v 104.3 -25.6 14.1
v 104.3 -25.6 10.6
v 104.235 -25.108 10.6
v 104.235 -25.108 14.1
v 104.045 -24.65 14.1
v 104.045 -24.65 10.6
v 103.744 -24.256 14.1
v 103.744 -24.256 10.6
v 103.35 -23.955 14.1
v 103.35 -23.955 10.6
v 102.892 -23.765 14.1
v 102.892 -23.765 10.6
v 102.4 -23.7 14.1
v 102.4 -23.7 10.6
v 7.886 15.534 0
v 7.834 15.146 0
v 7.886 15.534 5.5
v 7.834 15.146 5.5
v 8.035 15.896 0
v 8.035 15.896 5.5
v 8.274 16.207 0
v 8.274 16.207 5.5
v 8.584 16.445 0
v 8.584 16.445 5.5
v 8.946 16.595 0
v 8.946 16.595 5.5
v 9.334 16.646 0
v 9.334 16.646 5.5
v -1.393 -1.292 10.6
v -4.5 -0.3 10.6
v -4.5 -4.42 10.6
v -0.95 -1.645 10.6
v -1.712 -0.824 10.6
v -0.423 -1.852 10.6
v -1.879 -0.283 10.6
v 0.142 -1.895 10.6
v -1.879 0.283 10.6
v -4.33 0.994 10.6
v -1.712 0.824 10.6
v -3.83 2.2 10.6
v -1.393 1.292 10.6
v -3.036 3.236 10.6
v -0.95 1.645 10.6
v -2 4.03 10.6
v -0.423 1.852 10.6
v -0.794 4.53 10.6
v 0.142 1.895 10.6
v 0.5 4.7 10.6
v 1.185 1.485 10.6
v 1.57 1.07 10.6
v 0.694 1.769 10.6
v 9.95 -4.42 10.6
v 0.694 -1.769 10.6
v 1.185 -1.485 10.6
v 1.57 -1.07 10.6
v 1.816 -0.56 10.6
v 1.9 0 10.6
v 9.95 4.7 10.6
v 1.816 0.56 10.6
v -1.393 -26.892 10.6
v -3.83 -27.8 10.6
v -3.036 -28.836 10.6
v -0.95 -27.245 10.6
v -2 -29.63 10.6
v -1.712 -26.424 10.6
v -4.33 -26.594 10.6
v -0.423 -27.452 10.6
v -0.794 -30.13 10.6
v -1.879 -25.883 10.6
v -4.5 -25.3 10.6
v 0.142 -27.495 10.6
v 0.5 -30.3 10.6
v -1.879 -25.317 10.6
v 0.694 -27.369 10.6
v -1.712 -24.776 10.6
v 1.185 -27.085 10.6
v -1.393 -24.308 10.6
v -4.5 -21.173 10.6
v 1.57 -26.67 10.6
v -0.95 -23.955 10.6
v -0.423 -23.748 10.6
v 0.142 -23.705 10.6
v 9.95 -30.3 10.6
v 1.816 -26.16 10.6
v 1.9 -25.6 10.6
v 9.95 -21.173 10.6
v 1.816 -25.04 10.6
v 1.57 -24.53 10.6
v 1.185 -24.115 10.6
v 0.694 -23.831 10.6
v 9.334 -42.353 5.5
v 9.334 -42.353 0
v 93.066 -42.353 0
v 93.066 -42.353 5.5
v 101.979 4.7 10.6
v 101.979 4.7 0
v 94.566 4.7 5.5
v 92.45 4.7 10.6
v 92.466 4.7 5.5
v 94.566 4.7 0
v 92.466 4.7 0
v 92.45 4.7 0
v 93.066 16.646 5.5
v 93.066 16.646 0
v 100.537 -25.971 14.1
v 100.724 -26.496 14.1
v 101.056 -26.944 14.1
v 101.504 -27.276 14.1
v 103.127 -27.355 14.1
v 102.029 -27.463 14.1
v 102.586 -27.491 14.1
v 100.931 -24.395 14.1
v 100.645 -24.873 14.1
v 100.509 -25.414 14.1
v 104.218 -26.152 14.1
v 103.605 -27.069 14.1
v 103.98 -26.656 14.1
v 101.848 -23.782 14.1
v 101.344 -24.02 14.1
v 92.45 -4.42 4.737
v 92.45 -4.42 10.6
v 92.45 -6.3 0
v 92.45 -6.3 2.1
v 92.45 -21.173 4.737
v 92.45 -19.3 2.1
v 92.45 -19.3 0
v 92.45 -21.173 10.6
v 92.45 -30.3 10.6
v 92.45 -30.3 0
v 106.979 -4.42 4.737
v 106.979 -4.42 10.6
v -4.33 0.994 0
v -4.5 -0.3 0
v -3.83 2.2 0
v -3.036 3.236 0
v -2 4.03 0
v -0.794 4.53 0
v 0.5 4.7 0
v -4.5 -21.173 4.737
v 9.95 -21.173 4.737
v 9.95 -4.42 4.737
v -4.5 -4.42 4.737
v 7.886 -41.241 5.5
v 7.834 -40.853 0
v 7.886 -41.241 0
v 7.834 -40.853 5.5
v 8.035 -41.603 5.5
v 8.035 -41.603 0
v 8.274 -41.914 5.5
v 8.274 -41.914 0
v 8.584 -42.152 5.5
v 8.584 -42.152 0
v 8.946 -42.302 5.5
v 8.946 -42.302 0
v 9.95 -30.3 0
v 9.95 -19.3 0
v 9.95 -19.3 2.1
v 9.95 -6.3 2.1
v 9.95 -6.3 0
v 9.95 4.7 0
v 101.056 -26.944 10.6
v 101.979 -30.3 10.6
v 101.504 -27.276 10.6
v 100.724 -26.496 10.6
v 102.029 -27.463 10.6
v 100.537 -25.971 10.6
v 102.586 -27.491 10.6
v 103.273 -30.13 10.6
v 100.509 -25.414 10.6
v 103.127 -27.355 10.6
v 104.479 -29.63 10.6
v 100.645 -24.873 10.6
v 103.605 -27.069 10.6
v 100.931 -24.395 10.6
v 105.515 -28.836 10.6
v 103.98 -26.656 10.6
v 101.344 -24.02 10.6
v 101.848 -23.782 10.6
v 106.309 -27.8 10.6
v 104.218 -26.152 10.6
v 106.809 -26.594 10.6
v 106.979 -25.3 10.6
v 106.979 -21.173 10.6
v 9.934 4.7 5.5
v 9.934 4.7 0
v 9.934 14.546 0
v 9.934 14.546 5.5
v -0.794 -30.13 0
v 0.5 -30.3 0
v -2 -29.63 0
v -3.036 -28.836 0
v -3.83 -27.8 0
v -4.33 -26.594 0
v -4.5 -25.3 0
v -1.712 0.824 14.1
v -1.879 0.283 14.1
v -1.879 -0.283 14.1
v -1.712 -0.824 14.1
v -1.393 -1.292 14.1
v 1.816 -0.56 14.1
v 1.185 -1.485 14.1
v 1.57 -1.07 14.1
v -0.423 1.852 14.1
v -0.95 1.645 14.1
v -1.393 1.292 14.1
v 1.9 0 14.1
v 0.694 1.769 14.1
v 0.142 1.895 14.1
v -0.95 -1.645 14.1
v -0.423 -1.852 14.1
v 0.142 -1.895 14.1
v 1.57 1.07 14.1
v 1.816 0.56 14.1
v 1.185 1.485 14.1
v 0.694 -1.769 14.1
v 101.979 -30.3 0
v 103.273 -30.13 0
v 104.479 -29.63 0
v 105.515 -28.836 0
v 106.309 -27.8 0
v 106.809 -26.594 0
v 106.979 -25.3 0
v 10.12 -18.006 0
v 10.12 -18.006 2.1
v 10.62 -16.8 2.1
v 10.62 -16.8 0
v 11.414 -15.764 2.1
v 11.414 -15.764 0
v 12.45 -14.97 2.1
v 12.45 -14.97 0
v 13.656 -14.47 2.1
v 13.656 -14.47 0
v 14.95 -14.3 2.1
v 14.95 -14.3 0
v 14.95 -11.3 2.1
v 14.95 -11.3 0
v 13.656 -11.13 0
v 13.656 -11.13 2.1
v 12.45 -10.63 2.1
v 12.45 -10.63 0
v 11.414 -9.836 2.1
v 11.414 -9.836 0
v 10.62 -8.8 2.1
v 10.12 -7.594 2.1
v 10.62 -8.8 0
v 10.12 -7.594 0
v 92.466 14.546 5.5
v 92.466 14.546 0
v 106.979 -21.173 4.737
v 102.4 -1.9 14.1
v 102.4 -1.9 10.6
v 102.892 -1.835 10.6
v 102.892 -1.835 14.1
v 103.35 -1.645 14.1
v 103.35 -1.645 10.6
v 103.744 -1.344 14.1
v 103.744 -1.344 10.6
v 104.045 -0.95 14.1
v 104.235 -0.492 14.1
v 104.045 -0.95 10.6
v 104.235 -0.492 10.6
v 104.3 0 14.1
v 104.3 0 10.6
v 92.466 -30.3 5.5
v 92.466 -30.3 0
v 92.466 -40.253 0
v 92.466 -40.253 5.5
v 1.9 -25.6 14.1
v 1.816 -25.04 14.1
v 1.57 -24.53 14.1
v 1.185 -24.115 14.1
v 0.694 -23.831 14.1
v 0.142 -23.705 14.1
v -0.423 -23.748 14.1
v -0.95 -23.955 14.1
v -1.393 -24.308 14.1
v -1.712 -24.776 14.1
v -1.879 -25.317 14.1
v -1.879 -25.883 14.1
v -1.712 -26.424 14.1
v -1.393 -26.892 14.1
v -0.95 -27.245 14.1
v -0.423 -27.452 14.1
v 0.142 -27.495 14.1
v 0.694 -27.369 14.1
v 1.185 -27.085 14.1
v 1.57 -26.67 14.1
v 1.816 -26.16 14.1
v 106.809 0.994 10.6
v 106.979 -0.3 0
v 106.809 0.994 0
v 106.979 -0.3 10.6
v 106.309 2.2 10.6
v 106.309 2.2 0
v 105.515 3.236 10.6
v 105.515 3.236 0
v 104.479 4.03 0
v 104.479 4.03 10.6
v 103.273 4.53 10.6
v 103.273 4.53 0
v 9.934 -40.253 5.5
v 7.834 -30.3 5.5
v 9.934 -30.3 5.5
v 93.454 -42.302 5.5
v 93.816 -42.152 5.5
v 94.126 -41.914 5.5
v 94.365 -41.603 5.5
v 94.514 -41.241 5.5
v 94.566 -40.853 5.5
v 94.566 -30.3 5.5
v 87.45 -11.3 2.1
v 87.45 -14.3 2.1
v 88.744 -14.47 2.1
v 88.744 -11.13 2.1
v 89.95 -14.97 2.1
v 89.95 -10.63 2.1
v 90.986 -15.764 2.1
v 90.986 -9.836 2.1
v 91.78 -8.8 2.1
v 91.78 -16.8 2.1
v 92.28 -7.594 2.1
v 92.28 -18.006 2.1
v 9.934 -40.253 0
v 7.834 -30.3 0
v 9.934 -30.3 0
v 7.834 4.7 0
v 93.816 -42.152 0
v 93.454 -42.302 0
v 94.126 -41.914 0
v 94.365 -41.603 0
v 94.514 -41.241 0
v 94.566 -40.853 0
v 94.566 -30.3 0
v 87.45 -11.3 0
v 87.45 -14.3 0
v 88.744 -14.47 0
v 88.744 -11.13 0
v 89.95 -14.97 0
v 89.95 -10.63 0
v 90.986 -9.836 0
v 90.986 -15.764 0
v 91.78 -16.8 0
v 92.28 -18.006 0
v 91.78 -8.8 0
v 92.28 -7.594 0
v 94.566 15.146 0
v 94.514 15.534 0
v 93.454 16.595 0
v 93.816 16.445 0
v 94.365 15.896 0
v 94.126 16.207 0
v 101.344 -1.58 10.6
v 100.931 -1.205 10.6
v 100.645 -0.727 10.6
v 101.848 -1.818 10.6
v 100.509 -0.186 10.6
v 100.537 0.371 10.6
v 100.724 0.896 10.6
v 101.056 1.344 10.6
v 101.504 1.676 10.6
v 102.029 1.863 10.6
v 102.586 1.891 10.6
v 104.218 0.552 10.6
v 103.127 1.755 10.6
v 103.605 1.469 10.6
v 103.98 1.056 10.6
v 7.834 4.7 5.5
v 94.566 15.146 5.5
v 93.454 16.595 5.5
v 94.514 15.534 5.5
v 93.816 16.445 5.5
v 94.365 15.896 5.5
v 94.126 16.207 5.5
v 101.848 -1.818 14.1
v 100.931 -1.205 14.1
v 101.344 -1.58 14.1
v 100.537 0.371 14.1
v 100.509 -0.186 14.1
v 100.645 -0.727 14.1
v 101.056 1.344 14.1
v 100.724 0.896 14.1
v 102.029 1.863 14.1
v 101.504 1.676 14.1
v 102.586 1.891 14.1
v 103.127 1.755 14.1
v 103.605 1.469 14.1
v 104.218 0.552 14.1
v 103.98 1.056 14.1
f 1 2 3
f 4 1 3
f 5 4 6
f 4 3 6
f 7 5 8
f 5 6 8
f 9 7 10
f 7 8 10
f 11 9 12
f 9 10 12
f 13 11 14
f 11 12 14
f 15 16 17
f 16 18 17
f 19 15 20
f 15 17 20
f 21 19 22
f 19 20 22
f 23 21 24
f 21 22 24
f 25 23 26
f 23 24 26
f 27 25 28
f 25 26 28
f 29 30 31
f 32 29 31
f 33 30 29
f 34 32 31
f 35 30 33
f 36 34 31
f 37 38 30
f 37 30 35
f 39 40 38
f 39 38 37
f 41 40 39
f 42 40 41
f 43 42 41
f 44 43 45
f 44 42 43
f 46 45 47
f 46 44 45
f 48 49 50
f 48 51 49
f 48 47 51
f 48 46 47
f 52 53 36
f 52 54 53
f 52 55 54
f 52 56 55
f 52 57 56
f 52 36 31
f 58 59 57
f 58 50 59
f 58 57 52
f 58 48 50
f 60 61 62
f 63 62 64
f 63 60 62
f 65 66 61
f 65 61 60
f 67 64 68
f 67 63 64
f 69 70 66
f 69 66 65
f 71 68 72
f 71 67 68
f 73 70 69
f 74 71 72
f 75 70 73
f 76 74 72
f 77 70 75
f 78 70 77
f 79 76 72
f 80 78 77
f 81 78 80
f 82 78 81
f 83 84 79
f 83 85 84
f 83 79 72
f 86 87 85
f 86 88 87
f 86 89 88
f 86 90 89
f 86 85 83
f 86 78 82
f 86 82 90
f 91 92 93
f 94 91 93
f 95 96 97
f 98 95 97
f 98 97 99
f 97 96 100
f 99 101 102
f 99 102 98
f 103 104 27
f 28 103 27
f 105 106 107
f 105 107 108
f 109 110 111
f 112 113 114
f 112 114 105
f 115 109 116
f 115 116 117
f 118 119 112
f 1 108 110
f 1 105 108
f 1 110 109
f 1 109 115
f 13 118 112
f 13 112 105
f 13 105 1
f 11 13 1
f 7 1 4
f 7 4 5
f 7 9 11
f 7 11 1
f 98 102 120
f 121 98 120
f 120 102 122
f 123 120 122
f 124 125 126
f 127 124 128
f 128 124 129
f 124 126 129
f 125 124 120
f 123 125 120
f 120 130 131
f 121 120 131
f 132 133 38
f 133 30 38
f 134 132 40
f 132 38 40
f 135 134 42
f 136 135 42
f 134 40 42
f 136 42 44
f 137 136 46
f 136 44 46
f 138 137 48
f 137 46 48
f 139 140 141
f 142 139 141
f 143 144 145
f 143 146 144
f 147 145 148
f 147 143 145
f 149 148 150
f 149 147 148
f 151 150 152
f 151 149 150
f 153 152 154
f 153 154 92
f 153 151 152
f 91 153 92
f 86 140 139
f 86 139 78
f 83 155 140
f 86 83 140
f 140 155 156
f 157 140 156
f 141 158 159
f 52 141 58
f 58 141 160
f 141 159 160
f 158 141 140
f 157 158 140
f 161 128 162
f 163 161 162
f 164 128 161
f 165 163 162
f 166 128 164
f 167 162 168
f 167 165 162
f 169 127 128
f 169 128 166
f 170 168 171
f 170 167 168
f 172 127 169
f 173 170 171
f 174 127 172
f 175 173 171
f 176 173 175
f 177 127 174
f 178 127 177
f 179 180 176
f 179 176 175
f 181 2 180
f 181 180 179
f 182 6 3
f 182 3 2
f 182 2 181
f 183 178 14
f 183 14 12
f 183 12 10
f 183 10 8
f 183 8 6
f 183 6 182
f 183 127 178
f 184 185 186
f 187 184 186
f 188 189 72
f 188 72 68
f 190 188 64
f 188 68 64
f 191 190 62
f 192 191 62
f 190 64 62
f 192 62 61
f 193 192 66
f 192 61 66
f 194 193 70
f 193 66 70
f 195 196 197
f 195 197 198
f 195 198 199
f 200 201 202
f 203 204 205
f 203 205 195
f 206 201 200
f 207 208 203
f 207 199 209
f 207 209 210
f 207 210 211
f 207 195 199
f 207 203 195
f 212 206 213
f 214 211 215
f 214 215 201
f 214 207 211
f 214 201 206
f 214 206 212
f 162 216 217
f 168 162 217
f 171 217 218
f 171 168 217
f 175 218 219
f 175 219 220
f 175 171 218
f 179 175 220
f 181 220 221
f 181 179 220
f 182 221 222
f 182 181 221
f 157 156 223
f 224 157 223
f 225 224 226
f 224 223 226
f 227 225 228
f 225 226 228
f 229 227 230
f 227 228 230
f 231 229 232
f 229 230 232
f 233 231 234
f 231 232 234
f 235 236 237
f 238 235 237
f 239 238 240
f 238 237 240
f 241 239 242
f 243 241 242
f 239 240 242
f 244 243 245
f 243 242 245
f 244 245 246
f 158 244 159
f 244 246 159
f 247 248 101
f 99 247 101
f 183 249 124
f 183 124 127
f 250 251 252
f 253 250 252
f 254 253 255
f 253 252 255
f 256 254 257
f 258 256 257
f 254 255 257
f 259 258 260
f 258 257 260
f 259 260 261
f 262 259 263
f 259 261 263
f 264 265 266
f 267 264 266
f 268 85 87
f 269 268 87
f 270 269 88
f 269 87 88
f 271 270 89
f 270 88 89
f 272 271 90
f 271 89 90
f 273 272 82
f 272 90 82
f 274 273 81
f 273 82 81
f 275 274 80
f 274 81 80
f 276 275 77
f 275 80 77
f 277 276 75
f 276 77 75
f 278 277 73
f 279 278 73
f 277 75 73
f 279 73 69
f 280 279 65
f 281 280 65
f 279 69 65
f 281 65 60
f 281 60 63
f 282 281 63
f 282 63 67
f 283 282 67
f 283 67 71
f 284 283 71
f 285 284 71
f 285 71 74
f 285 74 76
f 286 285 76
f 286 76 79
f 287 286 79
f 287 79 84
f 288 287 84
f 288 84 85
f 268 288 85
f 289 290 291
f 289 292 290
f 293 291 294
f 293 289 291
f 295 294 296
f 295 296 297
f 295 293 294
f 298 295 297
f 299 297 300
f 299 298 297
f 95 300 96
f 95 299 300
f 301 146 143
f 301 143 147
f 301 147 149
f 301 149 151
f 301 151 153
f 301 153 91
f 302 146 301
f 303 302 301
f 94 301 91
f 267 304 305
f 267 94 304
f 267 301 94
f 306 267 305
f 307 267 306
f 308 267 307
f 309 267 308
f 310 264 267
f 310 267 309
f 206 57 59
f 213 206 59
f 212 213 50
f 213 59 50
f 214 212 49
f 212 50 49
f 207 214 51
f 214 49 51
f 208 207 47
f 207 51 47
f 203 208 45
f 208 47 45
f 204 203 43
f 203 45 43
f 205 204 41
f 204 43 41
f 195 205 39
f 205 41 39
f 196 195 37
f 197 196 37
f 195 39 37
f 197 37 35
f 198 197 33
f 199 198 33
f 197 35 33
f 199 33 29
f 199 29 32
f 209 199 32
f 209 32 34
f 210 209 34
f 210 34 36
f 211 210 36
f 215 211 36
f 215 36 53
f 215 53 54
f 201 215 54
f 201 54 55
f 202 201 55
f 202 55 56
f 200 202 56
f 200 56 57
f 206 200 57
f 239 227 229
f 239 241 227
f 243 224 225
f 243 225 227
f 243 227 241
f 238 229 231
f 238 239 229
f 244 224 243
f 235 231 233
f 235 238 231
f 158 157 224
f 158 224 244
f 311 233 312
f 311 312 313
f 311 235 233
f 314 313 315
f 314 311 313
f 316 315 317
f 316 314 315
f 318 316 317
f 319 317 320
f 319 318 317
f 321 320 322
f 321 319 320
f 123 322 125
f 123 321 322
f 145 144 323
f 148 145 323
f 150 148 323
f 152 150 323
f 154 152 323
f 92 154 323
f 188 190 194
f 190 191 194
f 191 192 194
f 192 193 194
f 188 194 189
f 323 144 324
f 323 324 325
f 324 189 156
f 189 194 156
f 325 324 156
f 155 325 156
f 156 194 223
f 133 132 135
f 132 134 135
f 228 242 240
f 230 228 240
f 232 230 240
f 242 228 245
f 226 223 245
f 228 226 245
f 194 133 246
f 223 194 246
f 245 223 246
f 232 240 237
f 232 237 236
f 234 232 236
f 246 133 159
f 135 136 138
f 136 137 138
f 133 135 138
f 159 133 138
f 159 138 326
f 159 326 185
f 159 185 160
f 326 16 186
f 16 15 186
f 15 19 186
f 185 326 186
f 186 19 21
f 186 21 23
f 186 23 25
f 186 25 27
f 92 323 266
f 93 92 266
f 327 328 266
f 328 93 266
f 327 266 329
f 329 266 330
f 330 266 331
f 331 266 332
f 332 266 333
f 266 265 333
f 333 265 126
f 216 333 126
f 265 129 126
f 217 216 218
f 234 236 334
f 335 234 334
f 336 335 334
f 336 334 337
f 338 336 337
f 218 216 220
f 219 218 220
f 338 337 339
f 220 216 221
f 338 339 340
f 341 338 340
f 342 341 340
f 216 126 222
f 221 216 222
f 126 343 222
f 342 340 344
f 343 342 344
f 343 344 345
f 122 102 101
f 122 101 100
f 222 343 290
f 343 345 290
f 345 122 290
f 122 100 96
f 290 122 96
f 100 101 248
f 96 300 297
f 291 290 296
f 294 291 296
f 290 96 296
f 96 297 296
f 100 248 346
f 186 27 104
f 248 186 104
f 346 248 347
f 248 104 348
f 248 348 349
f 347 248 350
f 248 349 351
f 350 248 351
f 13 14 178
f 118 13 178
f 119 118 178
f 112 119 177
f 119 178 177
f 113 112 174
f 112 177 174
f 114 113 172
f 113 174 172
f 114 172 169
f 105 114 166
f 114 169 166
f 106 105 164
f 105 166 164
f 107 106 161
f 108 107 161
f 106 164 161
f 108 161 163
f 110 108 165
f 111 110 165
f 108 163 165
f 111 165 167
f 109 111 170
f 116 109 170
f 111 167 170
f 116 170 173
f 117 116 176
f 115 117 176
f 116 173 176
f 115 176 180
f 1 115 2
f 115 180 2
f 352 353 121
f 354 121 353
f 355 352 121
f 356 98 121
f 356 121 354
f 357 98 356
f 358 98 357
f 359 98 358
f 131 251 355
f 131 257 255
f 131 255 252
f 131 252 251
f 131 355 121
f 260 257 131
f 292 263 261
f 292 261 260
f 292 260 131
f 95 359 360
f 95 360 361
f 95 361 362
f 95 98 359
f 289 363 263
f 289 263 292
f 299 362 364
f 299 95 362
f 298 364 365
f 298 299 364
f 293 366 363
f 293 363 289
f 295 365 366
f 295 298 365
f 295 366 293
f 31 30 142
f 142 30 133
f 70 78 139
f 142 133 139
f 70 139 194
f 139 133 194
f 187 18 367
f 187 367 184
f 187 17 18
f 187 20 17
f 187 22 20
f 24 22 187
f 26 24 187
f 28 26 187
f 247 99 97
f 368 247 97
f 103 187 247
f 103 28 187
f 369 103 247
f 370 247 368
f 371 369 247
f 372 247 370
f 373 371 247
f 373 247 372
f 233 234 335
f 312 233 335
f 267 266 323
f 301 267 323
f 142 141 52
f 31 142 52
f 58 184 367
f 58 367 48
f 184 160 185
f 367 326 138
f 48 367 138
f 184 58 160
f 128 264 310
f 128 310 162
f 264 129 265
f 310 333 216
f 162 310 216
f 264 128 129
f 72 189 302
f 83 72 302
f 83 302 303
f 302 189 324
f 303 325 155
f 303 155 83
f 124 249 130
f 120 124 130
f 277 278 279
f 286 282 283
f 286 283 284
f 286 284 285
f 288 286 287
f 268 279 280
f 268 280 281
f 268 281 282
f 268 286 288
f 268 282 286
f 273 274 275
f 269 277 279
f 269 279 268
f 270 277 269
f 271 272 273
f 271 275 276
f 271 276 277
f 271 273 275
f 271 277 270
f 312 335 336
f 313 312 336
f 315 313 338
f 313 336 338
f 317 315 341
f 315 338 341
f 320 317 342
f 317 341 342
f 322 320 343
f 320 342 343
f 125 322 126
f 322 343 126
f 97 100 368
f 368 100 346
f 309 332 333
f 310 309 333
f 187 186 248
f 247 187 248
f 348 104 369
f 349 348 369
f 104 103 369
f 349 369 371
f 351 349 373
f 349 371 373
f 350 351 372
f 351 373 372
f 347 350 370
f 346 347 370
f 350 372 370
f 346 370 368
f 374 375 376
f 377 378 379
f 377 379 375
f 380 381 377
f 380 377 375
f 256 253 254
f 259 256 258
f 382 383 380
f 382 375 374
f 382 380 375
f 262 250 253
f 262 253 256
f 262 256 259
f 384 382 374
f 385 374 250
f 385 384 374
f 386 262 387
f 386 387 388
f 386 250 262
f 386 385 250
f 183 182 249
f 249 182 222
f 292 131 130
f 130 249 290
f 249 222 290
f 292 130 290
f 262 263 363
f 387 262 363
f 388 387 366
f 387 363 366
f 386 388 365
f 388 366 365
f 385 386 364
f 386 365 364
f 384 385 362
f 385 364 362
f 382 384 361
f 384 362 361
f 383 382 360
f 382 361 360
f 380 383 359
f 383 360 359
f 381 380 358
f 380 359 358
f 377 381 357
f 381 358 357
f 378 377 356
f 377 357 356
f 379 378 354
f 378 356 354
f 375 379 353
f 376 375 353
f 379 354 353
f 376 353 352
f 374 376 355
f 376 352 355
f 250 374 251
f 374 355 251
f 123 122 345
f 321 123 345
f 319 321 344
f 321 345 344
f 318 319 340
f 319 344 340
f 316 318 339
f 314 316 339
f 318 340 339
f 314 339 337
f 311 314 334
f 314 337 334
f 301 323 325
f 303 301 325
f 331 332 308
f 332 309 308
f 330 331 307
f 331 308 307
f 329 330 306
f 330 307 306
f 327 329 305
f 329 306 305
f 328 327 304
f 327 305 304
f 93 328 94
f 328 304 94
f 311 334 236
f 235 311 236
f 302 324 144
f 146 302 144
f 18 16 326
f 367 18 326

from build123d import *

# Parameters (mm, degrees)
F0_R     = 1.9
F1_DEPTH = 14.1
F2_DEPTH = 2.1
F3_DEPTH = 10.6
F4_W     = 16.752516
F4_H     = 7.375009
F5_DEPTH = 150
F6_R     = 5
F7_W     = 76.531014
F7_H     = 2.1
F8_DEPTH = 5.5
F9_R     = 1.5


with BuildPart() as f1:
    # F0 (on Top) → F1 (new body)
    with BuildSketch(Plane.XY):
        with BuildLine():
            ThreePointArc((104.3, 0), (101.056497, 1.343503), (102.4, -1.9))
            ThreePointArc((102.4, -1.9), (103.743503, -1.343503), (104.3, 0))
        make_face()
        with BuildLine():
            ThreePointArc((102.4, -23.7), (101.056497, -26.943503), (104.3, -25.6))
            ThreePointArc((104.3, -25.6), (103.743503, -24.256497), (102.4, -23.7))
        make_face()
        with Locations((0, -25.6)):
            Circle(F0_R)
        Circle(F0_R)
    extrude(amount=F1_DEPTH)



with BuildPart() as f2:
    # F0 (on Top) → F2 (new body)
    with BuildSketch(Plane.XY):
        with BuildLine():
            Line((9.95, -14.3), (9.95, -19.3))
            ThreePointArc((9.95, -19.3), (11.414466, -15.764466), (14.95, -14.3))
            Line((14.95, -14.3), (51.2, -14.3))
            Line((51.2, -14.3), (51.2, -11.3))
            Line((51.2, -11.3), (14.95, -11.3))
            ThreePointArc((14.95, -11.3), (11.414466, -9.835534), (9.95, -6.3))
            Line((9.95, -6.3), (9.95, -11.3))
            Line((9.95, -11.3), (9.95, -14.3))
        make_face()
        with BuildLine():
            Line((51.2, -11.3), (51.2, -14.3))
            Line((51.2, -14.3), (67.3, -14.3))
            Line((67.3, -14.3), (72.3, -14.3))
            Line((72.3, -14.3), (87.45, -14.3))
            ThreePointArc((87.45, -14.3), (90.985534, -15.764466), (92.45, -19.3))
            Line((92.45, -19.3), (92.45, -6.3))
            ThreePointArc((92.45, -6.3), (90.985534, -9.835534), (87.45, -11.3))
            Line((87.45, -11.3), (72.3, -11.3))
            Line((72.3, -11.3), (67.3, -11.3))
            Line((67.3, -11.3), (51.2, -11.3))
        make_face()
    extrude(amount=F2_DEPTH)


with BuildPart() as f1_1:
    add(f1.part)

    add(f2.part)  # F3 merges F2
    # F0 (on Top) → F3 (join)
    with BuildSketch(Plane.XY):
        Polygon((-4.5, -30.3), (4.5, -30.3), (4.579243, -30.3), (9.95, -30.3), (9.95, -19.3), (9.95, -14.3), (9.95, -11.3), (9.95, -6.3), (9.95, 4.7), (4.579243, 4.7), (4.5, 4.7), (-4.5, 4.7), align=None)
        with Locations((0, -25.6)):
            Circle(F0_R, mode=Mode.SUBTRACT)
        Circle(F0_R, mode=Mode.SUBTRACT)
        Polygon((92.45, -6.3), (92.45, -19.3), (92.45, -30.3), (97.820757, -30.3), (106.979243, -30.3), (106.979243, 4.7), (97.820757, 4.7), (92.45, 4.7), align=None)
        with BuildLine():
            ThreePointArc((102.4, -23.7), (103.743503, -24.256497), (104.3, -25.6))
            ThreePointArc((104.3, -25.6), (101.056497, -26.943503), (102.4, -23.7))
        make_face(mode=Mode.SUBTRACT)
        with BuildLine():
            ThreePointArc((104.3, 0), (103.743503, -1.343503), (102.4, -1.9))
            ThreePointArc((102.4, -1.9), (101.056497, 1.343503), (104.3, 0))
        make_face(mode=Mode.SUBTRACT)
    extrude(amount=F3_DEPTH)

    # F4 (on Right) → F5 (cut, symmetric)
    with BuildSketch(Plane.YZ):
        with Locations((-12.796251, 8.42476)):
            Rectangle(F4_W, F4_H)
    extrude(amount=F5_DEPTH, both=True, mode=Mode.SUBTRACT)

    # F6
    f6_edges = [f1_1.edges().sort_by_distance(p)[0] for p in [
        (-4.5, 4.7, 5.3),
        (-4.5, -30.3, 5.3),
        (106.979243, 4.7, 5.3),
        (106.979243, -30.3, 5.3),
    ]]
    fillet(f6_edges, radius=F6_R)

    # F7 (on Top) → F8 (join)
    with BuildSketch(Plane.XY):
        Polygon((9.934493, 4.12971), (9.934493, 4.738468), (9.934493, 14.546), (12.934493, 14.546), (12.934493, 16.646), (7.834493, 16.646), (7.834493, 9.642234), (7.834493, 4.738468), (7.834493, 4.12971), align=None)
        with Locations((51.2, 15.596)):
            Rectangle(F7_W, F7_H)
        Polygon((89.465507, 16.646), (89.465507, 14.546), (92.465507, 14.546), (92.465507, 4.738468), (92.465507, 4.379703), (94.565507, 4.379703), (94.565507, 4.738468), (94.565507, 9.642234), (94.565507, 16.646), align=None)
        with Locations((51.2, -41.303271)):
            Rectangle(F7_W, F7_H)
        Polygon((12.934493, -42.353271), (12.934493, -40.253271), (9.934493, -40.253271), (9.934493, -30.445739), (9.934493, -29.831897), (7.834493, -29.831897), (7.834493, -30.445739), (7.834493, -35.349505), (7.834493, -42.353271), align=None)
        Polygon((92.465507, -40.253271), (89.465507, -40.253271), (89.465507, -42.353271), (94.565507, -42.353271), (94.565507, -35.349505), (94.565507, -30.445739), (94.565507, -29.955346), (92.465507, -29.955346), (92.465507, -30.445739), align=None)
    extrude(amount=F8_DEPTH)

    # F9
    f9_edges = [f1_1.edges().sort_by_distance(p)[0] for p in [
        (94.565507, -42.353271, 2.75),
        (94.565507, 16.646, 2.75),
        (7.834493, 16.646, 2.75),
        (7.834493, -42.353271, 2.75),
    ]]
    fillet(f9_edges, radius=F9_R)


solid = f1_1.part
